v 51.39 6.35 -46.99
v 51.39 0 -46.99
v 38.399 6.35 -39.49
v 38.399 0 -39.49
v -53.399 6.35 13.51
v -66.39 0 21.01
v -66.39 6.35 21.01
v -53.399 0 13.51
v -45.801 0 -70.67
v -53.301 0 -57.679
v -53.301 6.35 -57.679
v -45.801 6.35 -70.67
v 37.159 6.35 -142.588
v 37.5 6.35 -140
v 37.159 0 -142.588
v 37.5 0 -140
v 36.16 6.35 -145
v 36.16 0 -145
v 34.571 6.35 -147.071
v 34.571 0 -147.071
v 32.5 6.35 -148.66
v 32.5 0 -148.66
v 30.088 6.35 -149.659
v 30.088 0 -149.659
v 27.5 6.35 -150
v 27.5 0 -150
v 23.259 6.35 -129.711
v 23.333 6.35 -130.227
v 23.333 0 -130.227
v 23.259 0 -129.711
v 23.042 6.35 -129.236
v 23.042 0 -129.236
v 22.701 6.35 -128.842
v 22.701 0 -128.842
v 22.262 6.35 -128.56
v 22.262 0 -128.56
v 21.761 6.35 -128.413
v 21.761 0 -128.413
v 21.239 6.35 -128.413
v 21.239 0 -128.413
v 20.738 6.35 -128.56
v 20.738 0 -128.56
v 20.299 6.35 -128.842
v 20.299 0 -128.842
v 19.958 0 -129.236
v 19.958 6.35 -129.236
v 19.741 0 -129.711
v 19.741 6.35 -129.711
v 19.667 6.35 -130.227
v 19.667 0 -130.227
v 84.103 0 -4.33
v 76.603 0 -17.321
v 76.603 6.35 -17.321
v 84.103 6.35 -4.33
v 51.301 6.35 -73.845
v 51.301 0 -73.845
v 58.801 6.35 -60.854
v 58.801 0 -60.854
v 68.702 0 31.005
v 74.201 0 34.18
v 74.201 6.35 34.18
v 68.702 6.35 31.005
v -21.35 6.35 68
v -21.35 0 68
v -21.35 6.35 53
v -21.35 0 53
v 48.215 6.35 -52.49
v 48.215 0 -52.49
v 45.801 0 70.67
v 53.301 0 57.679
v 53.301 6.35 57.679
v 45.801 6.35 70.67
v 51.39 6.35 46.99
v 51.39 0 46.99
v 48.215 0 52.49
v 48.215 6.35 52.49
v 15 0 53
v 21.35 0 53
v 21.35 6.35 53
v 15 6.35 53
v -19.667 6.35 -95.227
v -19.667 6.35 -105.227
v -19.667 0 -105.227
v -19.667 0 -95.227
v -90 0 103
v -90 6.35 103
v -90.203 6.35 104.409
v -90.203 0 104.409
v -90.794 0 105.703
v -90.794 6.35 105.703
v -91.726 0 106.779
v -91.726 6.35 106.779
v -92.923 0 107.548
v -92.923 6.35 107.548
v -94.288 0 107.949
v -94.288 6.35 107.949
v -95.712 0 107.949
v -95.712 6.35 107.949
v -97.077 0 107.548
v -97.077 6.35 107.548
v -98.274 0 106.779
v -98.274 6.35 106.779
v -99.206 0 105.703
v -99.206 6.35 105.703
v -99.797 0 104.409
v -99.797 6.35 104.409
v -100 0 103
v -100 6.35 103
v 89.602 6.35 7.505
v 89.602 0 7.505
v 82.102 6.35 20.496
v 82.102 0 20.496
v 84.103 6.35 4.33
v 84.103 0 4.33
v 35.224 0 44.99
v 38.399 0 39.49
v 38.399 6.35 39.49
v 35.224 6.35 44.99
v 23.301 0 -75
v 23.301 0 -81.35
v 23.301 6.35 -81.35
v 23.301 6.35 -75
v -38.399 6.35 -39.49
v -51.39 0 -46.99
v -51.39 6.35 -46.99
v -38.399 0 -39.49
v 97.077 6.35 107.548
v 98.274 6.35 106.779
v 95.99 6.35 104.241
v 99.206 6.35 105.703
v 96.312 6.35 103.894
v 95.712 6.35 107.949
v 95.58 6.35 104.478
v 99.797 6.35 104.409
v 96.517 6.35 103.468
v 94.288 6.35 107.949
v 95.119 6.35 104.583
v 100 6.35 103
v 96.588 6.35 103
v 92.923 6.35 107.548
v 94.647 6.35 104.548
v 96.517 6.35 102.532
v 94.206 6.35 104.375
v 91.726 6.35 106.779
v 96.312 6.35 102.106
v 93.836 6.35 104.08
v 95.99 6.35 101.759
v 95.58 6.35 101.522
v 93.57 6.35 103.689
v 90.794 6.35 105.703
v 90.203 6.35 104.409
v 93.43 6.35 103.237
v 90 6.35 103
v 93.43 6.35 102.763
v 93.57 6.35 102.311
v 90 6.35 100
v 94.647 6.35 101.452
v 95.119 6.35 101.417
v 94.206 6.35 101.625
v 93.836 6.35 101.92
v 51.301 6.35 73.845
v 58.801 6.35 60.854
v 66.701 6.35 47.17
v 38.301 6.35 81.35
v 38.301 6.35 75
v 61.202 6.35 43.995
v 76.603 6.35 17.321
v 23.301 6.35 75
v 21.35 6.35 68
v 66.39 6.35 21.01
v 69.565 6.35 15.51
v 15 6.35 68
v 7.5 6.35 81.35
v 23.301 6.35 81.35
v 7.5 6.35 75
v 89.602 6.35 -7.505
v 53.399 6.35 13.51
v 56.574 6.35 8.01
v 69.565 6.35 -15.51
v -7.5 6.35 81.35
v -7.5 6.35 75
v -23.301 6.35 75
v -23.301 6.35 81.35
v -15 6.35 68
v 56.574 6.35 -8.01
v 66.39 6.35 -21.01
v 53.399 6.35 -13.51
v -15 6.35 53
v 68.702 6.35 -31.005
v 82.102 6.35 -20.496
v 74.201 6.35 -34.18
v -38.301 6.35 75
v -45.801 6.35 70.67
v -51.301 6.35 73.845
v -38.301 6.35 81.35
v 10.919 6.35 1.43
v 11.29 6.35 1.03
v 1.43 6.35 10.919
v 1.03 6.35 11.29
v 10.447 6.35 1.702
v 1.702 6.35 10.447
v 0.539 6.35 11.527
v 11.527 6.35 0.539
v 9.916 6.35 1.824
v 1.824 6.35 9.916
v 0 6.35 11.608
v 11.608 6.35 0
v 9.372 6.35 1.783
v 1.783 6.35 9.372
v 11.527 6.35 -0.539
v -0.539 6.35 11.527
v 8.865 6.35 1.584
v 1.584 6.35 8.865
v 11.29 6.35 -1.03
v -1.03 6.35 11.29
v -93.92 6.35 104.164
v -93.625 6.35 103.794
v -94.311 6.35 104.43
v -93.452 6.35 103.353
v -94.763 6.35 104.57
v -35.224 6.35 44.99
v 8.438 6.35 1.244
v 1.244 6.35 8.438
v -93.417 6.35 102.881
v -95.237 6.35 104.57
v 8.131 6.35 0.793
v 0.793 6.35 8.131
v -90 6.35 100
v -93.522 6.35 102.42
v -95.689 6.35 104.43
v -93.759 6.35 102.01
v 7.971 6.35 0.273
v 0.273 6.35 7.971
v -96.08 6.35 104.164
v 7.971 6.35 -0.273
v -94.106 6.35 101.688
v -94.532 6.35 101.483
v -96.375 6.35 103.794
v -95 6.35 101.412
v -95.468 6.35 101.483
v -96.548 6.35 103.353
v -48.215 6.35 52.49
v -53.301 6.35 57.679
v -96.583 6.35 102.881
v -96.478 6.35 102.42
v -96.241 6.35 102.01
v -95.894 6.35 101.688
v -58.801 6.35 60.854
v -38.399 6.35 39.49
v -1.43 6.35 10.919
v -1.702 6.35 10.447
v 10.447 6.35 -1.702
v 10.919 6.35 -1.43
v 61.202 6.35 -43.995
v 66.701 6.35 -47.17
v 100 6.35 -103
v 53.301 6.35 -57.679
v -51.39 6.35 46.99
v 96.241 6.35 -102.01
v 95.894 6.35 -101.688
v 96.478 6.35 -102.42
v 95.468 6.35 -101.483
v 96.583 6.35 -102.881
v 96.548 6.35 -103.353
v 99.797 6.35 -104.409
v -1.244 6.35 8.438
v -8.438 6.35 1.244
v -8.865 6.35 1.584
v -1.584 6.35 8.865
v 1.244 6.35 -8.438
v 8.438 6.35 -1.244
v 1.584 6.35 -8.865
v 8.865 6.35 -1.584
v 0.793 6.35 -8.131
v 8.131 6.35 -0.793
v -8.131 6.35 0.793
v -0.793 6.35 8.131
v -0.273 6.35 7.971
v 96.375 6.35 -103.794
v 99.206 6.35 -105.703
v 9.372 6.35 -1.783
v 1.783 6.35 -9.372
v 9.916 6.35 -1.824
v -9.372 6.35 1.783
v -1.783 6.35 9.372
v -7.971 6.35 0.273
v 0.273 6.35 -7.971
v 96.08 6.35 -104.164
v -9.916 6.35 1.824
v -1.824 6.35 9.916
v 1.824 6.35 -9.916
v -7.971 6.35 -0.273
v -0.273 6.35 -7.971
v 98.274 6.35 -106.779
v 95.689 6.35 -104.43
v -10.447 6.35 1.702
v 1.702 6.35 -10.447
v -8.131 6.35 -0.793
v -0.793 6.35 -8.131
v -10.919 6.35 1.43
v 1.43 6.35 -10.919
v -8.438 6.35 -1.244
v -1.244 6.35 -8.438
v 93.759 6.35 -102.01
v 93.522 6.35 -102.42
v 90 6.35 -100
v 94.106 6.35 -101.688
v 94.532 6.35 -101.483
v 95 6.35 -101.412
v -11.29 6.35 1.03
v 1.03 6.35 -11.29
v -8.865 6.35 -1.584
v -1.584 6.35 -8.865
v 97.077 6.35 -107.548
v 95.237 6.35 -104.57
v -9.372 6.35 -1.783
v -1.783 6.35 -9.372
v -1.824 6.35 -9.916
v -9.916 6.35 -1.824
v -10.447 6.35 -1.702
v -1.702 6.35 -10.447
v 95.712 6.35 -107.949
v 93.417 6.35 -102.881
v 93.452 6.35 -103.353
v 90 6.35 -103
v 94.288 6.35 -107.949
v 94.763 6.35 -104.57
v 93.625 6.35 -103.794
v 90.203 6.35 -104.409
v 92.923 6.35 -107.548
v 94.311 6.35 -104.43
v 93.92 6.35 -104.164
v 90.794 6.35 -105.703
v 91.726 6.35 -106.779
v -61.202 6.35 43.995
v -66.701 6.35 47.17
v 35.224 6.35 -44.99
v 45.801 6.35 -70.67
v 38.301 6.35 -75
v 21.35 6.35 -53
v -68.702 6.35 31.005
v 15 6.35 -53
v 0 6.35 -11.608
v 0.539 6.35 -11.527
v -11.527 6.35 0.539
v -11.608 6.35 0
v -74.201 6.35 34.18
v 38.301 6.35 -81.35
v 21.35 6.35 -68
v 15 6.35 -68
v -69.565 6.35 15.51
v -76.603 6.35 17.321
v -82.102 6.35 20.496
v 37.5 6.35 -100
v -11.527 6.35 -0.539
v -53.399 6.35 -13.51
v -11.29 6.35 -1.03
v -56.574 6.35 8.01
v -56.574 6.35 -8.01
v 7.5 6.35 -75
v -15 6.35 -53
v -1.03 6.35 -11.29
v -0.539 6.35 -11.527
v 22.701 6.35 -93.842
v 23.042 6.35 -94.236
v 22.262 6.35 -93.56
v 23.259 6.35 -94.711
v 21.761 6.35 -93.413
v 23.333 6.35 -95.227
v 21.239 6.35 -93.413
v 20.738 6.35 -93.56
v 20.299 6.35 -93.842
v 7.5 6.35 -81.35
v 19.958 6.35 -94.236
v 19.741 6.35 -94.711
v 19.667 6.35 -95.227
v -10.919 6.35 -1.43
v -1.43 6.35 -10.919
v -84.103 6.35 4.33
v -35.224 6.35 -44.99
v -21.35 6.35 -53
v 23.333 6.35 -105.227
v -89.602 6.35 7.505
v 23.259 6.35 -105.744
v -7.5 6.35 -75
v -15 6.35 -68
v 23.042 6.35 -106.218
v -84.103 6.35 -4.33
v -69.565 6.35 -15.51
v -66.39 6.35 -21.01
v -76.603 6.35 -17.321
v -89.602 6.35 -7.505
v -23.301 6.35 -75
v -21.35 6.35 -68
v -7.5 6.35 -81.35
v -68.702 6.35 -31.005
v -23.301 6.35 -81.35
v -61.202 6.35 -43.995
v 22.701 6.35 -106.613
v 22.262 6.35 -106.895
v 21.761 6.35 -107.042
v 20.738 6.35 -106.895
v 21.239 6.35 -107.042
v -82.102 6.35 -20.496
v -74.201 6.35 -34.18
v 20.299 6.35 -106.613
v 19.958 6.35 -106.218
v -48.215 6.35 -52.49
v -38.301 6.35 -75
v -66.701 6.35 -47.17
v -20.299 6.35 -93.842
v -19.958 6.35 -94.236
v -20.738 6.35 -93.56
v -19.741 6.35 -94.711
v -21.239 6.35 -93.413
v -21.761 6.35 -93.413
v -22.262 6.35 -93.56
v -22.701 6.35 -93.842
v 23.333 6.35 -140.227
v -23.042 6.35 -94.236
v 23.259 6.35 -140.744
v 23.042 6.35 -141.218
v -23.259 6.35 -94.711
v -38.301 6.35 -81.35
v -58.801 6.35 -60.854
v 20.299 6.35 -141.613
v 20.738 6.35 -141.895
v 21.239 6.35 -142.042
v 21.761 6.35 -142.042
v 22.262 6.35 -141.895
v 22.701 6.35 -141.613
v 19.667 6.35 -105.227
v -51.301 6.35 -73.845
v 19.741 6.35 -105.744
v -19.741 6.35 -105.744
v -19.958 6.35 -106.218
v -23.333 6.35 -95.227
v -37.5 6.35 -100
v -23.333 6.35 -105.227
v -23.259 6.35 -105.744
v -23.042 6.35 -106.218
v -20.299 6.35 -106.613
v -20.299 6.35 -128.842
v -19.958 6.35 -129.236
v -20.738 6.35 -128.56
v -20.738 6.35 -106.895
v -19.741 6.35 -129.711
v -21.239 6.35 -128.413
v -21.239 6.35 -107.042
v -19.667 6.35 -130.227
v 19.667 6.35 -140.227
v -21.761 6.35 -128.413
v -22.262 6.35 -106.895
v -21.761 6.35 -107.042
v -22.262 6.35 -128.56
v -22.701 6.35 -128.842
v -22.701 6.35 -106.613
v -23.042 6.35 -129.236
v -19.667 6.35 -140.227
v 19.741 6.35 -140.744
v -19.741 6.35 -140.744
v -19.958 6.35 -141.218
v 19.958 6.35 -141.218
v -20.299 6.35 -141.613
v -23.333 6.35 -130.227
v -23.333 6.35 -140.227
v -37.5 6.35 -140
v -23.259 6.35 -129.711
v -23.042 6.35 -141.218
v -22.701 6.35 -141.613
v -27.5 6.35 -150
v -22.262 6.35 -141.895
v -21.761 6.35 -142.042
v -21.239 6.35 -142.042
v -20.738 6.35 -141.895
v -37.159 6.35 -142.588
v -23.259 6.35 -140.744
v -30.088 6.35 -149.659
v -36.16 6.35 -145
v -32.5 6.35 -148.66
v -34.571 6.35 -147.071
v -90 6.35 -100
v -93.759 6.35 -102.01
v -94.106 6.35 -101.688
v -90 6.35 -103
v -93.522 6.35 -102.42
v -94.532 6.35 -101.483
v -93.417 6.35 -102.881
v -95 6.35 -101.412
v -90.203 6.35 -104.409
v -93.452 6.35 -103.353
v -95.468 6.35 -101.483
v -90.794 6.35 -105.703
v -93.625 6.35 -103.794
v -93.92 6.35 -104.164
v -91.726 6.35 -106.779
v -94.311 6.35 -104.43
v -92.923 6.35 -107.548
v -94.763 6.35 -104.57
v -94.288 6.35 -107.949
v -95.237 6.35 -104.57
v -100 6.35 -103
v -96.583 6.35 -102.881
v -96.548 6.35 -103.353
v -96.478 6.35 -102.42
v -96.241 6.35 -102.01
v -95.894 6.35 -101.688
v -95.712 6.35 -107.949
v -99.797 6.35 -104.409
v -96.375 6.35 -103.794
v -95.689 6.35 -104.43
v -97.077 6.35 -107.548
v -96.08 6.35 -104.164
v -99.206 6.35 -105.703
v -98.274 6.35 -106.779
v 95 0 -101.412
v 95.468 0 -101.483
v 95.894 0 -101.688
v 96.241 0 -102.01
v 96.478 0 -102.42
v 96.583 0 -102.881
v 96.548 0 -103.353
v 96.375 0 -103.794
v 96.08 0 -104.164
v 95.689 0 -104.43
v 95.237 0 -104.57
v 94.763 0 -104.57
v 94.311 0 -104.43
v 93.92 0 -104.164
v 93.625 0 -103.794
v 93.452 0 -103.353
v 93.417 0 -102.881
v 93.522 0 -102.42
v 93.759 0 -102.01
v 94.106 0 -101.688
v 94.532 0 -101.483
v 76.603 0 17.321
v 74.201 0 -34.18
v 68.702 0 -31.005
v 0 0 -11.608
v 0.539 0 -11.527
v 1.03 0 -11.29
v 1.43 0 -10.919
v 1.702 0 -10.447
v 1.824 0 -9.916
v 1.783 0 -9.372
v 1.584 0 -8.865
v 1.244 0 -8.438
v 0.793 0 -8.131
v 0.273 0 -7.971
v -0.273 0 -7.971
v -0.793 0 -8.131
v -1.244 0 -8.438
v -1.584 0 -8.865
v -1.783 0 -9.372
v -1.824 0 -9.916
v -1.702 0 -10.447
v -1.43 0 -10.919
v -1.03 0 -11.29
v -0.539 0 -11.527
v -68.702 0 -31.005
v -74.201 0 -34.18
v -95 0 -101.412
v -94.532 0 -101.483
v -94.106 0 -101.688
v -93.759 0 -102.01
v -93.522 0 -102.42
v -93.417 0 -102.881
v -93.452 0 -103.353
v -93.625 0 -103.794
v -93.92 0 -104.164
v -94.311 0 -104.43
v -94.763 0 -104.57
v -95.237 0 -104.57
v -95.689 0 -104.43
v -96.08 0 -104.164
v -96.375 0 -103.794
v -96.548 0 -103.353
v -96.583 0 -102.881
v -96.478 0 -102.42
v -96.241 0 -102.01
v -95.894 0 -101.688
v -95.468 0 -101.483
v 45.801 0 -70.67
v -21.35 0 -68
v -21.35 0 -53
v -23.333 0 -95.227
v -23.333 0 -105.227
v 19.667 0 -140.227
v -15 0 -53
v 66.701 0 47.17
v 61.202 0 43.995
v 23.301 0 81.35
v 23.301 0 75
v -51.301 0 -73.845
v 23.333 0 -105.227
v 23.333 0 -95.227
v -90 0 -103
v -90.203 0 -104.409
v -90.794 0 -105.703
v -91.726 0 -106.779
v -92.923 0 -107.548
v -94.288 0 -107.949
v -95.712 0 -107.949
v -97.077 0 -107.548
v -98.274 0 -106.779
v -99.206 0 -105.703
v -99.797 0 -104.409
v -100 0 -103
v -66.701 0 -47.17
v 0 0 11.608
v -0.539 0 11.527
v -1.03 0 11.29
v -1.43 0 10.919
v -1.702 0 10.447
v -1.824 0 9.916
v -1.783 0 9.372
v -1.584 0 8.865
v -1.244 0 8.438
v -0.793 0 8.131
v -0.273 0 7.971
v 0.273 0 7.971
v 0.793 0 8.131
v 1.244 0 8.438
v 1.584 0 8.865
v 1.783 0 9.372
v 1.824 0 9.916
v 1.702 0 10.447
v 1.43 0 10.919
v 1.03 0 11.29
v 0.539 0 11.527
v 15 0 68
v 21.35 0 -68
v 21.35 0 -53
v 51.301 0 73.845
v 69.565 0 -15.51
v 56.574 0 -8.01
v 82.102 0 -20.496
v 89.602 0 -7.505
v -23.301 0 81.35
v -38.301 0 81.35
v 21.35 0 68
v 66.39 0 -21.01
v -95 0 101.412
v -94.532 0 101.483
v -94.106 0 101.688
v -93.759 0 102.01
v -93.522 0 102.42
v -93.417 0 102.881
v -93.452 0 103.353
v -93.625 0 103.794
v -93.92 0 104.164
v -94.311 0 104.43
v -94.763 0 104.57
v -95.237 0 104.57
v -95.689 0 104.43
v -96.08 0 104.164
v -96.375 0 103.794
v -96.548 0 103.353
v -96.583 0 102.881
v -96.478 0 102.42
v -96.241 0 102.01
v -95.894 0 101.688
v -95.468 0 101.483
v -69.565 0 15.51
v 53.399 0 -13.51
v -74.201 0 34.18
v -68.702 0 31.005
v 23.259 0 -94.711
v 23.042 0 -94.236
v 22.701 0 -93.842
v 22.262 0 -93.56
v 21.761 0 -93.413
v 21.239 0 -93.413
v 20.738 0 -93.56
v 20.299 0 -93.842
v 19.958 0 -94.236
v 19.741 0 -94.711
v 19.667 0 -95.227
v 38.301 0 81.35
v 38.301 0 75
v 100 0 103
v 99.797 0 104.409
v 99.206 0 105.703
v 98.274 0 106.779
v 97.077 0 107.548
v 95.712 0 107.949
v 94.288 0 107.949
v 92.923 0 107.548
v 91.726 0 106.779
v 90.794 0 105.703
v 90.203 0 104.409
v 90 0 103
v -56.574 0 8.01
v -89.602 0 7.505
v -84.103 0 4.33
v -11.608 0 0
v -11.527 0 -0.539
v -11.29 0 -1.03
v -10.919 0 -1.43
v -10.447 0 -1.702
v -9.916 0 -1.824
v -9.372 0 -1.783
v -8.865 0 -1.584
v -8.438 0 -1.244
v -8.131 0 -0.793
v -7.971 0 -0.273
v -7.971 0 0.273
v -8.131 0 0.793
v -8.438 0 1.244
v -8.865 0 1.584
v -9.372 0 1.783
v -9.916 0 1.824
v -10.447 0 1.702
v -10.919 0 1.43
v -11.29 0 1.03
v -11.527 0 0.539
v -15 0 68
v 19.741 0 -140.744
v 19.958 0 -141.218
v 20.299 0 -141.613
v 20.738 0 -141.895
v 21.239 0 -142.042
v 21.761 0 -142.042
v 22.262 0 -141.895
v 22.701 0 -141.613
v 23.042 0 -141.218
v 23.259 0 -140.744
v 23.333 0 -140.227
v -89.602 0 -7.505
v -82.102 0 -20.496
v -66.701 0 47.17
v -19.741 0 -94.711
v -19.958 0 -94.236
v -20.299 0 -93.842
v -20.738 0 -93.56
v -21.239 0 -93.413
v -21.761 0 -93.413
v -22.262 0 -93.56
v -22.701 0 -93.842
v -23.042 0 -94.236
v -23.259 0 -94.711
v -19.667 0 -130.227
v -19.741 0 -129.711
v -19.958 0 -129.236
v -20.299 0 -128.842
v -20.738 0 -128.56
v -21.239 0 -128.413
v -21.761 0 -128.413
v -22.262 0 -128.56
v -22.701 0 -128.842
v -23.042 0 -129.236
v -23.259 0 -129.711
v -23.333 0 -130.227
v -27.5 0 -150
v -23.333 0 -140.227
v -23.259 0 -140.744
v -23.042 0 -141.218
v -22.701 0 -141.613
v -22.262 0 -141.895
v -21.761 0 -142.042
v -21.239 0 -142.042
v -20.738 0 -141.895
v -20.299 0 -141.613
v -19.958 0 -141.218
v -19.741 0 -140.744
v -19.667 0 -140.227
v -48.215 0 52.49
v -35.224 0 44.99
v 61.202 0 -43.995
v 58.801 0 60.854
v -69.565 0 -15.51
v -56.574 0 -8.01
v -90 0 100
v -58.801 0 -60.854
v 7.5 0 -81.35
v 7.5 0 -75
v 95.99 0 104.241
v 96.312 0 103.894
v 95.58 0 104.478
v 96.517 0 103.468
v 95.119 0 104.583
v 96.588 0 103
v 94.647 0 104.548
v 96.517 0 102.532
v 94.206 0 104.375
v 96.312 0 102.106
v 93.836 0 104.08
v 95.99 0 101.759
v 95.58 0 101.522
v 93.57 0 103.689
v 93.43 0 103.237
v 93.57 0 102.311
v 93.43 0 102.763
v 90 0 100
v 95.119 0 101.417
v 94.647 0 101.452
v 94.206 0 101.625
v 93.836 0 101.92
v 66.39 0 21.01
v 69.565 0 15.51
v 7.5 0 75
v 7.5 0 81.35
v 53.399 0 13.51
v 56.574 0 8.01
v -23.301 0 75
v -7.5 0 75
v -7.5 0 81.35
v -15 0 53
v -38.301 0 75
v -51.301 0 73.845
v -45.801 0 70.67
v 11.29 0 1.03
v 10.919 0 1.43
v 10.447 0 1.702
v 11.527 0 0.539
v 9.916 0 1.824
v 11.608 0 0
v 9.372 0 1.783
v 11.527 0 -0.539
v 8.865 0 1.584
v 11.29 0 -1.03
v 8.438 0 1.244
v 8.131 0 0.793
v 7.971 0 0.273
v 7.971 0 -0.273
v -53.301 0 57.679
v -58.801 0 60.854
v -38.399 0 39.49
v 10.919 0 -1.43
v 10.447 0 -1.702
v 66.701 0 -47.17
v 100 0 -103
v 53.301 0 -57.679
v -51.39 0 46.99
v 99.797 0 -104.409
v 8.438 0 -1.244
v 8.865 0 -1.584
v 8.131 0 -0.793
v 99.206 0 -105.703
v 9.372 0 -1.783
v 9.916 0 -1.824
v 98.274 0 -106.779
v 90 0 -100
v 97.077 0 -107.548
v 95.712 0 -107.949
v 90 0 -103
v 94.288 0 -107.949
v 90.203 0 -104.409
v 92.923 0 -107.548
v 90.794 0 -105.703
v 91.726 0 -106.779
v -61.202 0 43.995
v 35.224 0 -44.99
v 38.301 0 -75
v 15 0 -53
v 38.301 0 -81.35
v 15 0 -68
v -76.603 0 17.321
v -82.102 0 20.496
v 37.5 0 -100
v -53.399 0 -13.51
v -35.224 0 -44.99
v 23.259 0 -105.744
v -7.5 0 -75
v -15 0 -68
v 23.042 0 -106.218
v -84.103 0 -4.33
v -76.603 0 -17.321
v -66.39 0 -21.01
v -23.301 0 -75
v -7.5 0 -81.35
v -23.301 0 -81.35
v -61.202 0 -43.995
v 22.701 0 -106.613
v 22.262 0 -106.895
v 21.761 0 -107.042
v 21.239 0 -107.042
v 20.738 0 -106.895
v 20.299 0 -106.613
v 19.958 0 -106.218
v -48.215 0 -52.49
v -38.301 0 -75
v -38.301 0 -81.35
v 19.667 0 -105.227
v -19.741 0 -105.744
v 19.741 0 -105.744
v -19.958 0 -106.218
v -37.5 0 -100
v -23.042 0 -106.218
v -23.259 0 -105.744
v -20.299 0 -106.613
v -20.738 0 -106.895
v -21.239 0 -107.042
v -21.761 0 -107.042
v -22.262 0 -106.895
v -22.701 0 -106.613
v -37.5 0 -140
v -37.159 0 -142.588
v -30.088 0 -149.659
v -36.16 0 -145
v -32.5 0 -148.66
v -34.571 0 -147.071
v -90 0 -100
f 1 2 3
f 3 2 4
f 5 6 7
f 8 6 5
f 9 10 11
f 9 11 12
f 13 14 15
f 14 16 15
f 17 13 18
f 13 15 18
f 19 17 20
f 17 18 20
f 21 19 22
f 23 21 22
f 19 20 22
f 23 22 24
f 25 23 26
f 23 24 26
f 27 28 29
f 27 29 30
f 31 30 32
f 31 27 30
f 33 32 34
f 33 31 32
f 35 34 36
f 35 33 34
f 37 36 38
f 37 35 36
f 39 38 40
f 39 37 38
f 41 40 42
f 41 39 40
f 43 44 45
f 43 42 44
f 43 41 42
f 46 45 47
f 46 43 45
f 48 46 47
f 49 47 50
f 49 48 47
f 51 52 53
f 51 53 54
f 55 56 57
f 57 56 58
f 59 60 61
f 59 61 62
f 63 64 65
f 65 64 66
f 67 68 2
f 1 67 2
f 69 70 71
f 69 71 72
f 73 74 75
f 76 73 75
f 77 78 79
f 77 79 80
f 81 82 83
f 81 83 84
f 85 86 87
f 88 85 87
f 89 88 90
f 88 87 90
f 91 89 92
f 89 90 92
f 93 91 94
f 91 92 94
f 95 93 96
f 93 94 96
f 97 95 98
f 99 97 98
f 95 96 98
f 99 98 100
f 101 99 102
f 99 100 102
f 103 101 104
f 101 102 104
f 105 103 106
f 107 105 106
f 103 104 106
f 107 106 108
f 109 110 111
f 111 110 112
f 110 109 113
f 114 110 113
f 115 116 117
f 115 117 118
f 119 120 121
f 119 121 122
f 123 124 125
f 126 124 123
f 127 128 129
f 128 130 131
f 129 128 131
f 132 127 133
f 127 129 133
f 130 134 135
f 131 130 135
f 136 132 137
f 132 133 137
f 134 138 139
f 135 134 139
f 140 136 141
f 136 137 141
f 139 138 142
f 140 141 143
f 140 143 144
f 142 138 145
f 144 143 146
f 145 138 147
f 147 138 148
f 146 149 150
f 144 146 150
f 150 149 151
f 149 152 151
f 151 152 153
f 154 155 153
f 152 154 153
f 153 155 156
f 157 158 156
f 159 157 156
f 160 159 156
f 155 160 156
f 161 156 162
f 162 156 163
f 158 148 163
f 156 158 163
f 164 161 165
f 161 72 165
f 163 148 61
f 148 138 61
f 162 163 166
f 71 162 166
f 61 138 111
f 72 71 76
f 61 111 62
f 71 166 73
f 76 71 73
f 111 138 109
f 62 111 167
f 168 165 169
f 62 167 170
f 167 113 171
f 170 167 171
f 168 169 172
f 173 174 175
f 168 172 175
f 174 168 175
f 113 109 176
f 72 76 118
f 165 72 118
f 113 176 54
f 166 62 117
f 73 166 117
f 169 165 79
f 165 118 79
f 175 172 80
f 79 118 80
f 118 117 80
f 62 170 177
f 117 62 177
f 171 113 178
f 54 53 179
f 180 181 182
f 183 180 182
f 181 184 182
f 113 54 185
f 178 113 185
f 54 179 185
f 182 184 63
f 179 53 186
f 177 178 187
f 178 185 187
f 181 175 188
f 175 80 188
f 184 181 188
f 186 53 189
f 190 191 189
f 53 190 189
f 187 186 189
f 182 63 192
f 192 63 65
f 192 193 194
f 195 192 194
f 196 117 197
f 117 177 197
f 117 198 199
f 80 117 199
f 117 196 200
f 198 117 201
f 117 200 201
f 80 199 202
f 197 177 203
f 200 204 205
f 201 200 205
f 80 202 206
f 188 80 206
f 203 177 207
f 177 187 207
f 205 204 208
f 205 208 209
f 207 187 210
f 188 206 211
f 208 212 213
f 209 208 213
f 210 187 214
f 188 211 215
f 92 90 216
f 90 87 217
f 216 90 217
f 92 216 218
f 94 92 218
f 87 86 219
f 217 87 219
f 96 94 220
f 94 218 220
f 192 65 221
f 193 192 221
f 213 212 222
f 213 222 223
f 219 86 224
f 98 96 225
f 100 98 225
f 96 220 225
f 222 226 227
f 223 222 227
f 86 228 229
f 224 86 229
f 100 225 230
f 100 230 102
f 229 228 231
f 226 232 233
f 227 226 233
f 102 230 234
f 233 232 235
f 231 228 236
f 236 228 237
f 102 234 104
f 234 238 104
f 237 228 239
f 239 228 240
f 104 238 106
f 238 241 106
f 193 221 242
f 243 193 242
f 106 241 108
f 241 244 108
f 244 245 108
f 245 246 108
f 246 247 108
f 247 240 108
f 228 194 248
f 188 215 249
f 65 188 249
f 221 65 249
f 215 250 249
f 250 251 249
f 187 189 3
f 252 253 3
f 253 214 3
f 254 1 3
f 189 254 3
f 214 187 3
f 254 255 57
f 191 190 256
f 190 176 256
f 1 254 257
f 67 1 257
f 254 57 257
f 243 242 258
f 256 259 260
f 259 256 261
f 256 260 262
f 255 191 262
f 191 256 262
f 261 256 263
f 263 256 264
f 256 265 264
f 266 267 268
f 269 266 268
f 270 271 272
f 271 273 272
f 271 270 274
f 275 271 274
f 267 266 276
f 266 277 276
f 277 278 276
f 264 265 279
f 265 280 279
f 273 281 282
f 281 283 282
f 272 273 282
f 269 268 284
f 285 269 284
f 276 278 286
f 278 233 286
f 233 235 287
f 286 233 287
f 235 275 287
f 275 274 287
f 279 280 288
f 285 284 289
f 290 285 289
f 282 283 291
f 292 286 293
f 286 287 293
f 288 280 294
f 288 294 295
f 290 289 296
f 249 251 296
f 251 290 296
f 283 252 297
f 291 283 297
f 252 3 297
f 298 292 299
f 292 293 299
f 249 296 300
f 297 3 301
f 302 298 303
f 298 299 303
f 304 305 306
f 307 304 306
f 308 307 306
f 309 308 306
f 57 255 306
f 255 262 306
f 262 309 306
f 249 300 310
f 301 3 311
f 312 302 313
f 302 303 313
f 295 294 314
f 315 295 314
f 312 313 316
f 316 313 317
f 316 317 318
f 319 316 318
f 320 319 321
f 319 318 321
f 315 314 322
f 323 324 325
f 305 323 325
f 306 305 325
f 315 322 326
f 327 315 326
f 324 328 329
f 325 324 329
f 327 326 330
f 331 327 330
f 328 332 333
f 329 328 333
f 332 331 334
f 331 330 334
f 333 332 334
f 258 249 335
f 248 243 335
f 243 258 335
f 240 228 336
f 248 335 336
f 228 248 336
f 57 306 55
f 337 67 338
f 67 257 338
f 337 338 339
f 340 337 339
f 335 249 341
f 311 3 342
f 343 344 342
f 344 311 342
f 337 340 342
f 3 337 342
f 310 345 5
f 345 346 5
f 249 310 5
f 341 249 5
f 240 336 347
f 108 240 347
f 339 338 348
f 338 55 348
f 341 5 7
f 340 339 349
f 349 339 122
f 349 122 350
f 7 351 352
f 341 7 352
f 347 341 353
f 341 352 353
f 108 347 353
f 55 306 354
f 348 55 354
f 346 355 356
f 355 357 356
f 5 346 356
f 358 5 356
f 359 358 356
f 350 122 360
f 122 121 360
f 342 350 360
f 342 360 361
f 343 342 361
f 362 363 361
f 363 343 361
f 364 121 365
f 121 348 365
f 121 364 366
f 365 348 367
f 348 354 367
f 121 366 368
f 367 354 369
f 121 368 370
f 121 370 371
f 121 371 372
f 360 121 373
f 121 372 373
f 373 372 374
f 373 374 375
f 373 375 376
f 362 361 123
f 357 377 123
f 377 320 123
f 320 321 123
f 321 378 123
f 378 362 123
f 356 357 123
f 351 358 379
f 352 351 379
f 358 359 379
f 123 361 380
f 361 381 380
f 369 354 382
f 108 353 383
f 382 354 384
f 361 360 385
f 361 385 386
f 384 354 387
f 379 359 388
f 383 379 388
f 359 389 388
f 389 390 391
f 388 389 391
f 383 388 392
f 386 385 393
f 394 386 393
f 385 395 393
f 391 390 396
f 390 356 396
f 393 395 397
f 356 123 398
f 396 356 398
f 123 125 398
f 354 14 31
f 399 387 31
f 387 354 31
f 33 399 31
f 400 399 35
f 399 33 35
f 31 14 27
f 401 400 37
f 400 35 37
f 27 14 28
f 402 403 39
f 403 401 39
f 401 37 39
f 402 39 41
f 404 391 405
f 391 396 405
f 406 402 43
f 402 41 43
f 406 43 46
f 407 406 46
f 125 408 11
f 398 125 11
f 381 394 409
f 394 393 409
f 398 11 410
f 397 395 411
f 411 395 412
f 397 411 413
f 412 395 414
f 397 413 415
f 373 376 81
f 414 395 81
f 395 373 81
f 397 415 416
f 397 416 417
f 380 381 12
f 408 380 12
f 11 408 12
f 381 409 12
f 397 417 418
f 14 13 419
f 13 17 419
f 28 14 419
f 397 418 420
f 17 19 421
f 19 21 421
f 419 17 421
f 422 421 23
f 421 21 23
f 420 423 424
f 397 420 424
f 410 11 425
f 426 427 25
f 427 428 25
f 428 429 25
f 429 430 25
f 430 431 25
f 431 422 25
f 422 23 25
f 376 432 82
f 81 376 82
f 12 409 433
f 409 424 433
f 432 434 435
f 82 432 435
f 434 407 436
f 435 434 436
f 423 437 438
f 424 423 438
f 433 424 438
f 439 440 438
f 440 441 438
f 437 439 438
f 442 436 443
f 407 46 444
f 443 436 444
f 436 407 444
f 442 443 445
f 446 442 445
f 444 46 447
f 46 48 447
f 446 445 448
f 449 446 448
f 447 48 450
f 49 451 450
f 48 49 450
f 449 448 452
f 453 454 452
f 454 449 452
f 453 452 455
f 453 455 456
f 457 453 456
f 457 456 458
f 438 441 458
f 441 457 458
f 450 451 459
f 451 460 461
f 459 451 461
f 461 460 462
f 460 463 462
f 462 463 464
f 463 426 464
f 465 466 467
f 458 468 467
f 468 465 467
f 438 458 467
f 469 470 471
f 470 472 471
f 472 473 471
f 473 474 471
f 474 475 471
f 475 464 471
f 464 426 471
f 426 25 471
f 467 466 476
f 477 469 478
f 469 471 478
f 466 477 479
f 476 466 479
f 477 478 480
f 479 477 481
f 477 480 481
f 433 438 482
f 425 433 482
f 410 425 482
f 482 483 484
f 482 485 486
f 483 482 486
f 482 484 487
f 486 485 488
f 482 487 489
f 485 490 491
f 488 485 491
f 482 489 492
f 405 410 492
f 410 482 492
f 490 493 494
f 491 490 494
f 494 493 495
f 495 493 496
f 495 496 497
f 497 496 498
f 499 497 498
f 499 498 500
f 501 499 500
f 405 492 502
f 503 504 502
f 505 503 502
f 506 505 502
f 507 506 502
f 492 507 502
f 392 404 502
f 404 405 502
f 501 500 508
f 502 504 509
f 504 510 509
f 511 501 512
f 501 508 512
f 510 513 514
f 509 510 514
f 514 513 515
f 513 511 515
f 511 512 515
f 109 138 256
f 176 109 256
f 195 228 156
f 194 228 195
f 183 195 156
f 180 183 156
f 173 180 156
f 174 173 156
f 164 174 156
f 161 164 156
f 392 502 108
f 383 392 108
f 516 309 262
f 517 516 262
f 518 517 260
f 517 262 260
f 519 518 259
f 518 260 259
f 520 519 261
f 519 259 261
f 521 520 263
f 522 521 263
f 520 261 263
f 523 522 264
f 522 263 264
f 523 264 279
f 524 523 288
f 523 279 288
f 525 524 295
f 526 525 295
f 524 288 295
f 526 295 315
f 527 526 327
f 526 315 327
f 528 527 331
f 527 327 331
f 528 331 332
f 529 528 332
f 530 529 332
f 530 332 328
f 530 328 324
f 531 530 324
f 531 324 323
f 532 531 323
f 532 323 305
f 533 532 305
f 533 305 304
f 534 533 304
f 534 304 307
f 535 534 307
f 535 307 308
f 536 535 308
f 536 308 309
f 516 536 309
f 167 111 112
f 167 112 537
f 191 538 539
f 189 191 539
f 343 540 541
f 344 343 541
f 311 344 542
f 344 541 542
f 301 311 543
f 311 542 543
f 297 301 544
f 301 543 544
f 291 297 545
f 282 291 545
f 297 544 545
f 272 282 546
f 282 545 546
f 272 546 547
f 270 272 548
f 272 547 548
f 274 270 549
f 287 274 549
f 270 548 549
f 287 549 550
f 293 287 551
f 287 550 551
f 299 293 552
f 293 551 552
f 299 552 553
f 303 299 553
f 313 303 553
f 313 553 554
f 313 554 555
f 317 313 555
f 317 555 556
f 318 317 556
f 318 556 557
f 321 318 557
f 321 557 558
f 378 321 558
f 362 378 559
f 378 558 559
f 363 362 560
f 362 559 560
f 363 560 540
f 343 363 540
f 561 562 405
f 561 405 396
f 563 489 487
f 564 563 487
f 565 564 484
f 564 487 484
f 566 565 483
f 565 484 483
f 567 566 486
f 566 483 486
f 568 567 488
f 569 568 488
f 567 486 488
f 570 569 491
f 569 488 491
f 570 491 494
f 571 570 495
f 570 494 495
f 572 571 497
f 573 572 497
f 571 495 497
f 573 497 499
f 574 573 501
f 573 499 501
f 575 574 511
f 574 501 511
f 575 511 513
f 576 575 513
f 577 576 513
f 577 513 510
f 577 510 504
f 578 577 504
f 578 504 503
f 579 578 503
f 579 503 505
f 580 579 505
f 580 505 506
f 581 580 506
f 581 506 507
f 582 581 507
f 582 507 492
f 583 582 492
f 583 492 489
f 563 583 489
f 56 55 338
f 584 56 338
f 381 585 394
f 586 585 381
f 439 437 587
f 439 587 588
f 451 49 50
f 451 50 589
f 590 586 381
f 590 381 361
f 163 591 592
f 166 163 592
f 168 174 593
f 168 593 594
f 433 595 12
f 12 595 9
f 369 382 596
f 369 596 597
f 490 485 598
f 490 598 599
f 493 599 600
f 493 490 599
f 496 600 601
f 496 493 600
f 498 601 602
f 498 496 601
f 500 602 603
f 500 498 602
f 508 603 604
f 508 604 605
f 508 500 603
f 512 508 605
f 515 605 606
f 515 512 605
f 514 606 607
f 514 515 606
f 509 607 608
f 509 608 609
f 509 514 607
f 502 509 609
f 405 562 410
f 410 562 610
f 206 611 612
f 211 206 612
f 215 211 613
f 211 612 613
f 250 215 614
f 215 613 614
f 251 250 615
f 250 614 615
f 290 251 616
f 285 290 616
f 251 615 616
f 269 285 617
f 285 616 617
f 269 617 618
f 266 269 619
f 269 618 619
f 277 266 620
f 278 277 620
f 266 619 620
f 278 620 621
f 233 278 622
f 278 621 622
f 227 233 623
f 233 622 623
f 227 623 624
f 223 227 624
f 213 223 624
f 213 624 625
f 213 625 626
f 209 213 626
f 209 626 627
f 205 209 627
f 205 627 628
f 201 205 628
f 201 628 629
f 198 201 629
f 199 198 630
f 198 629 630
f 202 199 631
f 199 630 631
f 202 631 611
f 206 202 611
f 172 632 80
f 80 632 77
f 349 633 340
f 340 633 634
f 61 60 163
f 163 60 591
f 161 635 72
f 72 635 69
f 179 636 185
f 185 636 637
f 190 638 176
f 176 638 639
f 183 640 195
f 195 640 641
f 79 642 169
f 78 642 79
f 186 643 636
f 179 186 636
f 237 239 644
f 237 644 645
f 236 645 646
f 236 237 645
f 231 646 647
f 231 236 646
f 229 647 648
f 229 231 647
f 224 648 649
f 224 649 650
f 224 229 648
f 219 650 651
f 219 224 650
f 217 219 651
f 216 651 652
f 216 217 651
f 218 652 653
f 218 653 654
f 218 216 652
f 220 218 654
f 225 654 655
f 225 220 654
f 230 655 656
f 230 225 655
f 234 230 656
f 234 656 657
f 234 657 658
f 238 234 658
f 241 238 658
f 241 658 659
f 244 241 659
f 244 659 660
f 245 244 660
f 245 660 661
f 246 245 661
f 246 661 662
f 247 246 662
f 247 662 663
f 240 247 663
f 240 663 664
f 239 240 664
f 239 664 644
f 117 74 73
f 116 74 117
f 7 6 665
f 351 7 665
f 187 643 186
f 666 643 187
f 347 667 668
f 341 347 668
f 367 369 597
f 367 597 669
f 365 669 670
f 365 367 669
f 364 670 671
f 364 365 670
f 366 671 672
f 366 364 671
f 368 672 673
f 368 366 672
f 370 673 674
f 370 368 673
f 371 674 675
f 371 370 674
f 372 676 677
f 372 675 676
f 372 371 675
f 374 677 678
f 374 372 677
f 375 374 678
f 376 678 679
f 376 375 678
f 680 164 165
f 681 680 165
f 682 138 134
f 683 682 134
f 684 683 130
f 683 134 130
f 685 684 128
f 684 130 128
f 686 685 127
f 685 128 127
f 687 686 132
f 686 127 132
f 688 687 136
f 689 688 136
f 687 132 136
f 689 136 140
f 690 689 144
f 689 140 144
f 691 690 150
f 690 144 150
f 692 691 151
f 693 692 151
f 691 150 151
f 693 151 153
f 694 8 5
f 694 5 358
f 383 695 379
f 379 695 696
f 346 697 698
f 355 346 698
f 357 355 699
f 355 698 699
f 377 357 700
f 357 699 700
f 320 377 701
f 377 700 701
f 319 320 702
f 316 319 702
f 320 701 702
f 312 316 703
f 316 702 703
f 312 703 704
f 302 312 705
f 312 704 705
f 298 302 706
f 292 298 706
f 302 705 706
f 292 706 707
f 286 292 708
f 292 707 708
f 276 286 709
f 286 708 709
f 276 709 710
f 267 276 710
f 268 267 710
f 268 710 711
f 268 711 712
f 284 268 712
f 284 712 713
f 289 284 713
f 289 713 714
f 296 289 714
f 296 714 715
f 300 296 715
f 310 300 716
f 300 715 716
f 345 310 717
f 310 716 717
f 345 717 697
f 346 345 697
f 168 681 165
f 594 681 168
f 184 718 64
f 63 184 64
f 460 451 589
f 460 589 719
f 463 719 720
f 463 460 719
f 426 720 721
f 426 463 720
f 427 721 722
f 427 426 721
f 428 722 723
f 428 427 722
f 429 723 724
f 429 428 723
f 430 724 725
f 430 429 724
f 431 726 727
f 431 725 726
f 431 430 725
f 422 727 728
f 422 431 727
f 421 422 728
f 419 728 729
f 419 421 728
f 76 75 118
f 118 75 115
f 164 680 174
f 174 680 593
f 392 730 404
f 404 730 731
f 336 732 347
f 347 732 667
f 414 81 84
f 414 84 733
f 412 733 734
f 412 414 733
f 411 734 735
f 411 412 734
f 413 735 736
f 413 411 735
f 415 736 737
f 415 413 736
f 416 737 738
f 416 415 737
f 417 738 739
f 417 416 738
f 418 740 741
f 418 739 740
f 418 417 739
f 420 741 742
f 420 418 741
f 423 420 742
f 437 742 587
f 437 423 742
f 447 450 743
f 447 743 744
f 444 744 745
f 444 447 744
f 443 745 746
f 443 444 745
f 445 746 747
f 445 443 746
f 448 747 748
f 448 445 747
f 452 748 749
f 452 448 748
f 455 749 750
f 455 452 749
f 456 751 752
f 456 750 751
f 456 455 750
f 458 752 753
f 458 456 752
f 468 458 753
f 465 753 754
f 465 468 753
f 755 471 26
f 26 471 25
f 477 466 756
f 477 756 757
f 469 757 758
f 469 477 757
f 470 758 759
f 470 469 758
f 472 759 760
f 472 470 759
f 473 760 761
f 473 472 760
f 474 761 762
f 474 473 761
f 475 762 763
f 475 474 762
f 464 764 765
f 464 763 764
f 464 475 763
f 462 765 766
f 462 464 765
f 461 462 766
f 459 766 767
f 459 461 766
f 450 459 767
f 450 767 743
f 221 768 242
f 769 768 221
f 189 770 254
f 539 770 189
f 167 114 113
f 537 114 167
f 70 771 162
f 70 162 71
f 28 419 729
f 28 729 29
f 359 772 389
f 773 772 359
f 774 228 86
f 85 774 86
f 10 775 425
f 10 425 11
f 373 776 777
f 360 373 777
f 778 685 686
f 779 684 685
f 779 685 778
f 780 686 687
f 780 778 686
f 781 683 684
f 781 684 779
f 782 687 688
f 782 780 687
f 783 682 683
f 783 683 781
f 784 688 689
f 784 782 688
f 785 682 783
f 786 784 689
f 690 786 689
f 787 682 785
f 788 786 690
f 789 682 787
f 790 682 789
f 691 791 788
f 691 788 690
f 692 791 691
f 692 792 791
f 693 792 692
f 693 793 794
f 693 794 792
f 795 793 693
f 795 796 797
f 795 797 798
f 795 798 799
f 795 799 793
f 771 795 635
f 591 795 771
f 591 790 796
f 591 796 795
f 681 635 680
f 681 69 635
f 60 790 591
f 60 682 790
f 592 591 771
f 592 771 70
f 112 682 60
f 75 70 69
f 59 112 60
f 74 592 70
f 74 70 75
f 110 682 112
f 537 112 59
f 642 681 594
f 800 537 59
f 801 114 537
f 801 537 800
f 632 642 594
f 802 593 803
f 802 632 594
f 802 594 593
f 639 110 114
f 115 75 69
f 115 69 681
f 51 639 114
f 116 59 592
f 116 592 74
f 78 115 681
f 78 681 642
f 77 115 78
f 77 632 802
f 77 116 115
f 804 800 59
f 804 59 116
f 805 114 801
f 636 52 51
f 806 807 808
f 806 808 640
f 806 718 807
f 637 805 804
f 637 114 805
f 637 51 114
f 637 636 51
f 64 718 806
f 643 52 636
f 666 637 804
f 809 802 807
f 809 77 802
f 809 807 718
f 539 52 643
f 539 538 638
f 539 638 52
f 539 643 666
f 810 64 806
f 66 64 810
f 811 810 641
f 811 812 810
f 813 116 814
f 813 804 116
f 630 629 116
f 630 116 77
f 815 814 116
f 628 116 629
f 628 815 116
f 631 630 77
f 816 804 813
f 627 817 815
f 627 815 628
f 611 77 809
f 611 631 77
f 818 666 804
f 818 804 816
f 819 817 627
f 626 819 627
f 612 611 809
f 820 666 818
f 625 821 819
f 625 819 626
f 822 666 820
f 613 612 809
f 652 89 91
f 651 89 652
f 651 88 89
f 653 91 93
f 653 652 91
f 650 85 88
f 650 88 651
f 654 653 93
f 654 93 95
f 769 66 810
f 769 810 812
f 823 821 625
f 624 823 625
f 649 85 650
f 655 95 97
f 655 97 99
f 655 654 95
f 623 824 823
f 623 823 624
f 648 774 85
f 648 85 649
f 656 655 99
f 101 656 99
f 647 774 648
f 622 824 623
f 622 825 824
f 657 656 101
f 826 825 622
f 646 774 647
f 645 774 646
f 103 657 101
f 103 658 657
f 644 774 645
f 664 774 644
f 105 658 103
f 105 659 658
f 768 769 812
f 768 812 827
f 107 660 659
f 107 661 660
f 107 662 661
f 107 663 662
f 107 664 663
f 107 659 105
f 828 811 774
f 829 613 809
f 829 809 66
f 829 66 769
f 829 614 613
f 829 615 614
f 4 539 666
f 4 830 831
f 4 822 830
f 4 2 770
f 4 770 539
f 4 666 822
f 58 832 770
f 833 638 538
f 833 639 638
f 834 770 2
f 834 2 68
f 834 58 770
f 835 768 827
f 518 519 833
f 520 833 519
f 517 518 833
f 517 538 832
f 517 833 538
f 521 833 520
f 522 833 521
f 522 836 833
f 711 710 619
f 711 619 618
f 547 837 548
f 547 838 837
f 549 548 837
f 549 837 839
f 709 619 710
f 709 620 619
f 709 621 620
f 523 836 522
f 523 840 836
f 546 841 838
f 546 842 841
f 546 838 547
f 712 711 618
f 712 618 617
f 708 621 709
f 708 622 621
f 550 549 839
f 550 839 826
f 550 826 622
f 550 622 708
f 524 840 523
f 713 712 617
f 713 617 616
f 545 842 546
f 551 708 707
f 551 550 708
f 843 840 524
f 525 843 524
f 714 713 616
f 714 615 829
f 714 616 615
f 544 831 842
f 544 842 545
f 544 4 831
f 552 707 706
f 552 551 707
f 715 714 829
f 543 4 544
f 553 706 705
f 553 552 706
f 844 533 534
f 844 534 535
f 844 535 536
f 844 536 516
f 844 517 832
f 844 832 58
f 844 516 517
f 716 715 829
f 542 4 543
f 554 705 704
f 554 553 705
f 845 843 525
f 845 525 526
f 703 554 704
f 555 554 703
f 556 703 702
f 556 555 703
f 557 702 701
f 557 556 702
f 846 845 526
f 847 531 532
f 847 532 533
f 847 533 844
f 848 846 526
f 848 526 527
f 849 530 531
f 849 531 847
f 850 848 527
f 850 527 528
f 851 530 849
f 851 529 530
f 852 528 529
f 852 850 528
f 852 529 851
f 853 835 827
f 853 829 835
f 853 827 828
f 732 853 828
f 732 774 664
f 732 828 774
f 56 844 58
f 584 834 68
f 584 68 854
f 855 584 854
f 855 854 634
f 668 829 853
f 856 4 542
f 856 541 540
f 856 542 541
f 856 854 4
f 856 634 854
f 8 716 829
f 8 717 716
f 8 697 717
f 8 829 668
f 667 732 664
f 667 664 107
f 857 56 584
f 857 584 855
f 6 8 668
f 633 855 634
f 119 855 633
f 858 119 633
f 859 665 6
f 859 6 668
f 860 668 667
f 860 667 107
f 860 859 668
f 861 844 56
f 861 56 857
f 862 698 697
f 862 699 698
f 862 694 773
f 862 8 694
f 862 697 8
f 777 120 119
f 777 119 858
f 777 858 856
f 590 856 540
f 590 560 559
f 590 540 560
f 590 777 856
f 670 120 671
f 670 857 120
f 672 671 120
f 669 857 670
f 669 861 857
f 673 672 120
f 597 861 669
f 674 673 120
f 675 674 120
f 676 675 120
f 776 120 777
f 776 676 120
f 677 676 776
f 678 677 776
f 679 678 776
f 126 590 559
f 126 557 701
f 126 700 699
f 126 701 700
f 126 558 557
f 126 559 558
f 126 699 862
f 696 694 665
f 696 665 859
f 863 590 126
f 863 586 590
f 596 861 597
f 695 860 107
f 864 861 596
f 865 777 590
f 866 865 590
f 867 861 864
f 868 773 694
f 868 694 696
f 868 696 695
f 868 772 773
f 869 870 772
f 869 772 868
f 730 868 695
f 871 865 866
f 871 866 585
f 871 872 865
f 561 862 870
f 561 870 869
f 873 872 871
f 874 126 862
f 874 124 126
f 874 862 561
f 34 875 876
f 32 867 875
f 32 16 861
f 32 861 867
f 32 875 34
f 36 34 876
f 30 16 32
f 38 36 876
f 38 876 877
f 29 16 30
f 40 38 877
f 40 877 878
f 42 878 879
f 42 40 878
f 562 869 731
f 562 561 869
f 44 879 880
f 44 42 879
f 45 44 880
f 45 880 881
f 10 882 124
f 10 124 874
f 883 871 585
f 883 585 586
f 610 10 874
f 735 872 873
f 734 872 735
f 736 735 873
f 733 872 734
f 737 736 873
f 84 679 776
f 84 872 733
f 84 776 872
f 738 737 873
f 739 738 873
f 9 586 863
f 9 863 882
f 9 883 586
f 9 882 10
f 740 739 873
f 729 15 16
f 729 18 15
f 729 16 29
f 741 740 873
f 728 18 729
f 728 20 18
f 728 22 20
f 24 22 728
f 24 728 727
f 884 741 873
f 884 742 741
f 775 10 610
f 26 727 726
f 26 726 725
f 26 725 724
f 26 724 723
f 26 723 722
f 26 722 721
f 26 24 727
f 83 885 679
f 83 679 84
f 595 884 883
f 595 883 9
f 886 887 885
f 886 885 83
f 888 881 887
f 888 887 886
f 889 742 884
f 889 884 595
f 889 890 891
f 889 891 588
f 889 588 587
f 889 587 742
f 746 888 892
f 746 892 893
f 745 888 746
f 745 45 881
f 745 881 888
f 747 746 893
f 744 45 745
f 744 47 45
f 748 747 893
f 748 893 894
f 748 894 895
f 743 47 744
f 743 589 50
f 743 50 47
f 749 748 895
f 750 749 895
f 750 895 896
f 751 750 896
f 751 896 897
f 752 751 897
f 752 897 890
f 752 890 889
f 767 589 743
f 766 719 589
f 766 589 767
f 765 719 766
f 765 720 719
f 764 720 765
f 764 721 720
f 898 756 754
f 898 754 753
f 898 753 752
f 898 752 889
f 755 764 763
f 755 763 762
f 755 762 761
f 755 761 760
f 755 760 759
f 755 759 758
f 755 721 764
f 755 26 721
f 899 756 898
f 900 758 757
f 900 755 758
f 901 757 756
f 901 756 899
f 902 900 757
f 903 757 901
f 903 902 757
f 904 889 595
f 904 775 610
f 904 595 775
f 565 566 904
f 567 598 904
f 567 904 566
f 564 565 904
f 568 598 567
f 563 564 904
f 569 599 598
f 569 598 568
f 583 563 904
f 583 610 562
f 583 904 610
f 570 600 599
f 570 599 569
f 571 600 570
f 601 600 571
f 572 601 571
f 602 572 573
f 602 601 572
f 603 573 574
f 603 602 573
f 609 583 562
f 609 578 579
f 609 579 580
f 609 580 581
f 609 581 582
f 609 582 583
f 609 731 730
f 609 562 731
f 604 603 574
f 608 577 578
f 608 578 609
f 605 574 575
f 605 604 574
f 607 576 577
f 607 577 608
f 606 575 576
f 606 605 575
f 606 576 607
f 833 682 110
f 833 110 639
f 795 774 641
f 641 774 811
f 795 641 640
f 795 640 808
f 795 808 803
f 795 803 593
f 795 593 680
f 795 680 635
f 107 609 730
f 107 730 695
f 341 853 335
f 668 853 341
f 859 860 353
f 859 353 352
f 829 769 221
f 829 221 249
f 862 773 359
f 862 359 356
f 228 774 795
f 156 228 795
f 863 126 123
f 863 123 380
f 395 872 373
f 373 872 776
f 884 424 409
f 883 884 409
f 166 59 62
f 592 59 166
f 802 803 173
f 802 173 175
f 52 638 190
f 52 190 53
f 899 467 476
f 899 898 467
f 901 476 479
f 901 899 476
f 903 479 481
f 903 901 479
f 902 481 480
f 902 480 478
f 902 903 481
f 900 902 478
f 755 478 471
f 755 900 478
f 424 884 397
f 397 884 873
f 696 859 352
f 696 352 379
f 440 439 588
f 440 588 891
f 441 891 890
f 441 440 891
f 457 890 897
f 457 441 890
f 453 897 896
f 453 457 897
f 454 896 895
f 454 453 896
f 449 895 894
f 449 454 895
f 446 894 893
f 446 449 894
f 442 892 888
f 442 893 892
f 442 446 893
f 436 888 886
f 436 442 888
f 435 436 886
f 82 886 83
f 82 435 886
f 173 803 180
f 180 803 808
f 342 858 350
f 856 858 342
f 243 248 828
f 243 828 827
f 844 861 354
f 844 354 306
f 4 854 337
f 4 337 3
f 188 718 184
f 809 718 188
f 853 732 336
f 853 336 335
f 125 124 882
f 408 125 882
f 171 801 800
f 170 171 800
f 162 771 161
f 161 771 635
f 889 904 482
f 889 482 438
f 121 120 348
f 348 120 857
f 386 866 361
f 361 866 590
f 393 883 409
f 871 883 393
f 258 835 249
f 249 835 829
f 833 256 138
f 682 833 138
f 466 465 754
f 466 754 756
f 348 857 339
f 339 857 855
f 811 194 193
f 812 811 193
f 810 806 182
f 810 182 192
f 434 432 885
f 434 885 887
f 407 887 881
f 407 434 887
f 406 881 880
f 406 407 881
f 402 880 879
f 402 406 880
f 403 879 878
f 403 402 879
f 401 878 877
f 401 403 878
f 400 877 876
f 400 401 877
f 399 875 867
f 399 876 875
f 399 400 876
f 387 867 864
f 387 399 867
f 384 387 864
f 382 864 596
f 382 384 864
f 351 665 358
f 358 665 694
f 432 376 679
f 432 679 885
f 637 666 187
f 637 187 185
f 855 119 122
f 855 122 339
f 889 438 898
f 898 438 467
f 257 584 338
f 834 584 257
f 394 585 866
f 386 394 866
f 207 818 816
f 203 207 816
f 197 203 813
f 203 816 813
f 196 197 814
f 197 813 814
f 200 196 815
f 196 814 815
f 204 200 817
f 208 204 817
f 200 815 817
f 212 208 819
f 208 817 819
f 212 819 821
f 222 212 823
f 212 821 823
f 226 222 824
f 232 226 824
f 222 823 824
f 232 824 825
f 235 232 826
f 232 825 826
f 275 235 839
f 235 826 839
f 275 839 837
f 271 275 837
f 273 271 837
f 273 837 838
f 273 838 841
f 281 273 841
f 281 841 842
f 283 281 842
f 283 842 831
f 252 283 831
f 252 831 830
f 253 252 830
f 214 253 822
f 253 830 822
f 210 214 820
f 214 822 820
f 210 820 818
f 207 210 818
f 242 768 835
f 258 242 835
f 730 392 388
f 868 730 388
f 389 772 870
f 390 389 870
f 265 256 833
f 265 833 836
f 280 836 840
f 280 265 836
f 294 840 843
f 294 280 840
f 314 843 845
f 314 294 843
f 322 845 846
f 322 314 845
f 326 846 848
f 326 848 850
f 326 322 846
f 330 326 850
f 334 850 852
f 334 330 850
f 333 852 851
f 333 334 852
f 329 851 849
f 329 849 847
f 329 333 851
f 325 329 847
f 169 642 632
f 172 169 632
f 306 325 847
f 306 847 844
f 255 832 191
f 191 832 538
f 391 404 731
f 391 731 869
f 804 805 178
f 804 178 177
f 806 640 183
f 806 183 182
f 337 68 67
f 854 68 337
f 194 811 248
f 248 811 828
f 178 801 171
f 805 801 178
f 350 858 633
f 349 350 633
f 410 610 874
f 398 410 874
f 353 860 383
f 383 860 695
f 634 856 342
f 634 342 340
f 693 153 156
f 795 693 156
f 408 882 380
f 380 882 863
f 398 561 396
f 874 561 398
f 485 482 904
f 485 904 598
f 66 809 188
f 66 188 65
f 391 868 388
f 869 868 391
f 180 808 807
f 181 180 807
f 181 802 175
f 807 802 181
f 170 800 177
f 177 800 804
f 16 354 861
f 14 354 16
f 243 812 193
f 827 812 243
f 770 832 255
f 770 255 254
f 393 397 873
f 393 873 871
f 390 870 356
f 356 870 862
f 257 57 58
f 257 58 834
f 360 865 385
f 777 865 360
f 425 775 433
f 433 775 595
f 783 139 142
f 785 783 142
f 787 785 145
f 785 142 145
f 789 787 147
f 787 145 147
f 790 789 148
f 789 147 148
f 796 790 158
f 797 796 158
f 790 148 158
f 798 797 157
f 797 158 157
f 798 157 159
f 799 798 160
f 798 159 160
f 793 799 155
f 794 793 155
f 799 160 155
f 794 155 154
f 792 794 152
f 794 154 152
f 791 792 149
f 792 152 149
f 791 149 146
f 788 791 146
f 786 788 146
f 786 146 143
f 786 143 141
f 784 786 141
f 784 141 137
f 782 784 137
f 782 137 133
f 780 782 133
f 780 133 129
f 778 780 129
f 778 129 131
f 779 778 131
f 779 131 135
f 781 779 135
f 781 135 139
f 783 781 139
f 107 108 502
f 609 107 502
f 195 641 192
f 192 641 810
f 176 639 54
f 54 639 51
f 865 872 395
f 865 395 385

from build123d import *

# Parameters (mm, degrees)
ESQUISSE1_W                     = 200
ESQUISSE1_H                     = 200
BOSS_EXTRU_1_DEPTH              = 6.35
BOSS_EXTRU_2_DEPTH              = 6.35
ENL_V_MAT_EXTRU_1_REACH         = 149.324
ESQUISSE3_R                     = 1.5875
R_P_TITION_LIN_AIRE1_COUNT      = 2
R_P_TITION_LIN_AIRE1_PITCH      = 190
SYM_TRIE1_COPY_1_DEPTH          = 6.35
SYM_TRIE1_COPY_2_REACH          = 149.324
SYM_TRIE1_COPY_2_SKETCH_R       = 1.5875
ESQUISSE4_W                     = 75
ESQUISSE4_H                     = 50
BOSS_EXTRU_3_DEPTH              = 6.35
CONG_1_R                        = 10
SKETCH1_R                       = 1.8288
CUT_EXTRUDE1_DEPTH              = 6.35
CIRPATTERN1_COUNT               = 4
ESQUISSE7_W                     = 15
ESQUISSE7_H                     = 6.35
ENL_V_MAT_EXTRU_2_DEPTH         = 6.35
R_P_TITION_CIRCULAIRE1_COUNT    = 6
ENL_V_MAT_EXTRU_3_REACH         = 182.389
R_P_TITION_LIN_AIRE2_COUNT      = 2
R_P_TITION_LIN_AIRE2_PITCH      = 35
R_P_TITION_LIN_AIRE2_COUNT_DIR2 = 2
R_P_TITION_LIN_AIRE2_PITCH_DIR2 = 43
ENL_V_MAT_EXTRU_4_REACH         = 182.389
ESQUISSE9_W                     = 6.35
ESQUISSE9_H                     = 15
R_P_TITION_CIRCULAIRE2_COUNT    = 6


with BuildPart() as part:
    # Esquisse1 → Boss.-Extru.1 (new body)
    with BuildSketch(Plane(origin=(0, 0, 0), x_dir=(1, 0, 0), z_dir=(0, 1, 0))):
        Rectangle(ESQUISSE1_W, ESQUISSE1_H)
    extrude(amount=BOSS_EXTRU_1_DEPTH)

    # Esquisse2 → Boss.-Extru.2 (add)
    with BuildSketch(Plane(origin=(0, 6.35, 0), x_dir=(1, 0, 0), z_dir=(0, 1, 0))):
        with BuildLine():
            Line((-100, 100), (-90, 100))
            Line((-90, 100), (-90, 103))
            ThreePointArc((-90, 103), (-95, 108), (-100, 103))
            Line((-100, 103), (-100, 100))
        make_face()
    boss_extru_2 = extrude(amount=-BOSS_EXTRU_2_DEPTH)

    # Esquisse3 → Enlèv. mat.-Extru.1 (cut, up to next)
    with BuildSketch(Plane(origin=(0, 6.35, 0), x_dir=(1, 0, 0), z_dir=(0, 1, 0)), mode=Mode.PRIVATE) as enl_v_mat_extru_1_sk1:
        with Locations(Location((-95, 103, 0), (0, 0, 270))):
            Circle(ESQUISSE3_R)
    enl_v_mat_extru_1_tool1 = extrude(enl_v_mat_extru_1_sk1.sketch, amount=-ENL_V_MAT_EXTRU_1_REACH, mode=Mode.PRIVATE) & part.part
    enl_v_mat_extru_1 = enl_v_mat_extru_1_tool1.solids().sort_by_distance((-95, 6.35, -103))[0]
    add(enl_v_mat_extru_1, mode=Mode.SUBTRACT)

    # Répétition linéaire1: Boss.-Extru.2, Enlèv. mat.-Extru.1 ×2
    with Locations(*[(i * R_P_TITION_LIN_AIRE1_PITCH, 0, 0) for i in range(1, R_P_TITION_LIN_AIRE1_COUNT)]):
        add(boss_extru_2)
        add(enl_v_mat_extru_1, mode=Mode.SUBTRACT)

    # Symétrie1: Boss.-Extru.2, Enlèv. mat.-Extru.1 across plane
    add(boss_extru_2.mirror(Plane.XY))
    add(enl_v_mat_extru_1.mirror(Plane.XY), mode=Mode.SUBTRACT)

    # Symétrie1 copy 1 sketch → Symétrie1 copy 1 (add)
    with BuildSketch(Plane(origin=(190, 6.35, 0), x_dir=(1, 0, 0), z_dir=(0, 1, 0))):
        with BuildLine():
            Line((-100, -100), (-90, -100))
            Line((-90, -100), (-90, -103))
            ThreePointArc((-90, -103), (-95, -108), (-100, -103))
            Line((-100, -103), (-100, -100))
        make_face()
    extrude(amount=-SYM_TRIE1_COPY_1_DEPTH)

    # Symétrie1 copy 2 sketch → Symétrie1 copy 2 (cut, up to next)
    with BuildSketch(Plane(origin=(190, 6.35, 0), x_dir=(1, 0, 0), z_dir=(0, 1, 0)), mode=Mode.PRIVATE) as sym_trie1_copy_2_sk1:
        with Locations((-95, -103)):
            Circle(SYM_TRIE1_COPY_2_SKETCH_R)
    sym_trie1_copy_2_tool1 = extrude(sym_trie1_copy_2_sk1.sketch, amount=-SYM_TRIE1_COPY_2_REACH, mode=Mode.PRIVATE) & part.part
    add(sym_trie1_copy_2_tool1.solids().sort_by_distance((95, 6.35, 103))[0], mode=Mode.SUBTRACT)

    # Esquisse4 → Boss.-Extru.3 (add)
    with BuildSketch(Plane(origin=(0, 6.35, 0), x_dir=(1, 0, 0), z_dir=(0, 1, 0))):
        with Locations((0, 125)):
            Rectangle(ESQUISSE4_W, ESQUISSE4_H)
    extrude(amount=-BOSS_EXTRU_3_DEPTH)

    # Congé1
    cong_1_edges = [part.edges().sort_by_distance(p)[0] for p in [
        (-37.5, 3.175, -150),
        (37.5, 3.175, -150),
    ]]
    fillet(cong_1_edges, radius=CONG_1_R)

    # Sketch1 → Cut-Extrude1 (cut)
    with BuildSketch(Plane.XZ):
        with Locations(Location((0, -9.779, 0), (0, 0, 270))):
            Circle(SKETCH1_R)
    cut_extrude1 = extrude(amount=-CUT_EXTRUDE1_DEPTH, mode=Mode.SUBTRACT)

    # CirPattern1: Cut-Extrude1 ×4 about axis
    cirpattern1_axis = Axis((0, 0, 0), (0, 1, 0))
    for i in range(1, CIRPATTERN1_COUNT):
        add(cut_extrude1.rotate(cirpattern1_axis, i * 360 / CIRPATTERN1_COUNT), mode=Mode.SUBTRACT)

    # Esquisse7 → Enlèv. mat.-Extru.2 (cut)
    with BuildSketch(Plane.XZ):
        with Locations((30.801270189, -78.175)):
            Rectangle(ESQUISSE7_W, ESQUISSE7_H)
        with Locations((0, -78.175)):
            Rectangle(ESQUISSE7_W, ESQUISSE7_H)
        with Locations((-30.801270189, -78.175)):
            Rectangle(ESQUISSE7_W, ESQUISSE7_H)
    enl_v_mat_extru_2 = extrude(amount=-ENL_V_MAT_EXTRU_2_DEPTH, mode=Mode.SUBTRACT)

    # Répétition circulaire1: Enlèv. mat.-Extru.2 ×6 about axis
    r_p_tition_circulaire1_axis = Axis((0, 0, 0), (0, 1, 0))
    for i in range(1, R_P_TITION_CIRCULAIRE1_COUNT):
        add(enl_v_mat_extru_2.rotate(r_p_tition_circulaire1_axis, i * 360 / R_P_TITION_CIRCULAIRE1_COUNT), mode=Mode.SUBTRACT)

    # Esquisse8 → Enlèv. mat.-Extru.3 (cut, up to next)
    with BuildSketch(Plane(origin=(0, 6.35, 0), x_dir=(1, 0, 0), z_dir=(0, 1, 0)), mode=Mode.PRIVATE) as enl_v_mat_extru_3_sk1:
        with BuildLine():
            Line((-19.666666667, 140.227252842), (-19.666666667, 130.227252842))
            ThreePointArc((-19.666666667, 130.227252842), (-21.5, 128.393919509), (-23.333333333, 130.227252842))
            Line((-23.333333333, 130.227252842), (-23.333333333, 140.227252842))
            ThreePointArc((-23.333333333, 140.227252842), (-21.5, 142.060586175), (-19.666666667, 140.227252842))
        make_face()
    enl_v_mat_extru_3_tool1 = extrude(enl_v_mat_extru_3_sk1.sketch, amount=-ENL_V_MAT_EXTRU_3_REACH, mode=Mode.PRIVATE) & part.part
    enl_v_mat_extru_3 = enl_v_mat_extru_3_tool1.solids().sort_by_distance((-21.5, 6.35, -135.227253))[0]
    add(enl_v_mat_extru_3, mode=Mode.SUBTRACT)

    # Répétition linéaire2: Enl_v. mat.-Extru.3 2 × 2
    with Locations(*[(j * R_P_TITION_LIN_AIRE2_PITCH_DIR2, 0, i * R_P_TITION_LIN_AIRE2_PITCH) for i in range(R_P_TITION_LIN_AIRE2_COUNT) for j in range(R_P_TITION_LIN_AIRE2_COUNT_DIR2) if (i, j) != (0, 0)]):
        add(enl_v_mat_extru_3, mode=Mode.SUBTRACT)

    # Esquisse9 → Enlèv. mat.-Extru.4 (cut, up to next)
    with BuildSketch(Plane.XZ, mode=Mode.PRIVATE) as enl_v_mat_extru_4_sk1:
        with Locations((-18.175, -60.5)):
            Rectangle(ESQUISSE9_W, ESQUISSE9_H)
    enl_v_mat_extru_4_tool1 = extrude(enl_v_mat_extru_4_sk1.sketch, amount=-ENL_V_MAT_EXTRU_4_REACH, mode=Mode.PRIVATE) & part.part
    # Esquisse9 → Enlèv. mat.-Extru.4 (cut, up to next)
    with BuildSketch(Plane.XZ, mode=Mode.PRIVATE) as enl_v_mat_extru_4_sk2:
        with Locations((18.175, -60.5)):
            Rectangle(ESQUISSE9_W, ESQUISSE9_H)
    enl_v_mat_extru_4_tool2 = extrude(enl_v_mat_extru_4_sk2.sketch, amount=-ENL_V_MAT_EXTRU_4_REACH, mode=Mode.PRIVATE) & part.part
    enl_v_mat_extru_4_1 = enl_v_mat_extru_4_tool1.solids().sort_by_distance((-18.175, 0, -60.5))[0]
    add(enl_v_mat_extru_4_1, mode=Mode.SUBTRACT)
    enl_v_mat_extru_4_2 = enl_v_mat_extru_4_tool2.solids().sort_by_distance((18.175, 0, -60.5))[0]
    add(enl_v_mat_extru_4_2, mode=Mode.SUBTRACT)
    enl_v_mat_extru_4 = enl_v_mat_extru_4_1 + enl_v_mat_extru_4_2  # Enlèv. mat.-Extru.4 as one shape, for the pattern or mirror that repeats it

    # Répétition circulaire2: Enlèv. mat.-Extru.4 ×6 about axis
    r_p_tition_circulaire2_axis = Axis((0, 0, 0), (0, 1, 0))
    for i in range(1, R_P_TITION_CIRCULAIRE2_COUNT):
        add(enl_v_mat_extru_4.rotate(r_p_tition_circulaire2_axis, i * 360 / R_P_TITION_CIRCULAIRE2_COUNT), mode=Mode.SUBTRACT)


solid = part.part
